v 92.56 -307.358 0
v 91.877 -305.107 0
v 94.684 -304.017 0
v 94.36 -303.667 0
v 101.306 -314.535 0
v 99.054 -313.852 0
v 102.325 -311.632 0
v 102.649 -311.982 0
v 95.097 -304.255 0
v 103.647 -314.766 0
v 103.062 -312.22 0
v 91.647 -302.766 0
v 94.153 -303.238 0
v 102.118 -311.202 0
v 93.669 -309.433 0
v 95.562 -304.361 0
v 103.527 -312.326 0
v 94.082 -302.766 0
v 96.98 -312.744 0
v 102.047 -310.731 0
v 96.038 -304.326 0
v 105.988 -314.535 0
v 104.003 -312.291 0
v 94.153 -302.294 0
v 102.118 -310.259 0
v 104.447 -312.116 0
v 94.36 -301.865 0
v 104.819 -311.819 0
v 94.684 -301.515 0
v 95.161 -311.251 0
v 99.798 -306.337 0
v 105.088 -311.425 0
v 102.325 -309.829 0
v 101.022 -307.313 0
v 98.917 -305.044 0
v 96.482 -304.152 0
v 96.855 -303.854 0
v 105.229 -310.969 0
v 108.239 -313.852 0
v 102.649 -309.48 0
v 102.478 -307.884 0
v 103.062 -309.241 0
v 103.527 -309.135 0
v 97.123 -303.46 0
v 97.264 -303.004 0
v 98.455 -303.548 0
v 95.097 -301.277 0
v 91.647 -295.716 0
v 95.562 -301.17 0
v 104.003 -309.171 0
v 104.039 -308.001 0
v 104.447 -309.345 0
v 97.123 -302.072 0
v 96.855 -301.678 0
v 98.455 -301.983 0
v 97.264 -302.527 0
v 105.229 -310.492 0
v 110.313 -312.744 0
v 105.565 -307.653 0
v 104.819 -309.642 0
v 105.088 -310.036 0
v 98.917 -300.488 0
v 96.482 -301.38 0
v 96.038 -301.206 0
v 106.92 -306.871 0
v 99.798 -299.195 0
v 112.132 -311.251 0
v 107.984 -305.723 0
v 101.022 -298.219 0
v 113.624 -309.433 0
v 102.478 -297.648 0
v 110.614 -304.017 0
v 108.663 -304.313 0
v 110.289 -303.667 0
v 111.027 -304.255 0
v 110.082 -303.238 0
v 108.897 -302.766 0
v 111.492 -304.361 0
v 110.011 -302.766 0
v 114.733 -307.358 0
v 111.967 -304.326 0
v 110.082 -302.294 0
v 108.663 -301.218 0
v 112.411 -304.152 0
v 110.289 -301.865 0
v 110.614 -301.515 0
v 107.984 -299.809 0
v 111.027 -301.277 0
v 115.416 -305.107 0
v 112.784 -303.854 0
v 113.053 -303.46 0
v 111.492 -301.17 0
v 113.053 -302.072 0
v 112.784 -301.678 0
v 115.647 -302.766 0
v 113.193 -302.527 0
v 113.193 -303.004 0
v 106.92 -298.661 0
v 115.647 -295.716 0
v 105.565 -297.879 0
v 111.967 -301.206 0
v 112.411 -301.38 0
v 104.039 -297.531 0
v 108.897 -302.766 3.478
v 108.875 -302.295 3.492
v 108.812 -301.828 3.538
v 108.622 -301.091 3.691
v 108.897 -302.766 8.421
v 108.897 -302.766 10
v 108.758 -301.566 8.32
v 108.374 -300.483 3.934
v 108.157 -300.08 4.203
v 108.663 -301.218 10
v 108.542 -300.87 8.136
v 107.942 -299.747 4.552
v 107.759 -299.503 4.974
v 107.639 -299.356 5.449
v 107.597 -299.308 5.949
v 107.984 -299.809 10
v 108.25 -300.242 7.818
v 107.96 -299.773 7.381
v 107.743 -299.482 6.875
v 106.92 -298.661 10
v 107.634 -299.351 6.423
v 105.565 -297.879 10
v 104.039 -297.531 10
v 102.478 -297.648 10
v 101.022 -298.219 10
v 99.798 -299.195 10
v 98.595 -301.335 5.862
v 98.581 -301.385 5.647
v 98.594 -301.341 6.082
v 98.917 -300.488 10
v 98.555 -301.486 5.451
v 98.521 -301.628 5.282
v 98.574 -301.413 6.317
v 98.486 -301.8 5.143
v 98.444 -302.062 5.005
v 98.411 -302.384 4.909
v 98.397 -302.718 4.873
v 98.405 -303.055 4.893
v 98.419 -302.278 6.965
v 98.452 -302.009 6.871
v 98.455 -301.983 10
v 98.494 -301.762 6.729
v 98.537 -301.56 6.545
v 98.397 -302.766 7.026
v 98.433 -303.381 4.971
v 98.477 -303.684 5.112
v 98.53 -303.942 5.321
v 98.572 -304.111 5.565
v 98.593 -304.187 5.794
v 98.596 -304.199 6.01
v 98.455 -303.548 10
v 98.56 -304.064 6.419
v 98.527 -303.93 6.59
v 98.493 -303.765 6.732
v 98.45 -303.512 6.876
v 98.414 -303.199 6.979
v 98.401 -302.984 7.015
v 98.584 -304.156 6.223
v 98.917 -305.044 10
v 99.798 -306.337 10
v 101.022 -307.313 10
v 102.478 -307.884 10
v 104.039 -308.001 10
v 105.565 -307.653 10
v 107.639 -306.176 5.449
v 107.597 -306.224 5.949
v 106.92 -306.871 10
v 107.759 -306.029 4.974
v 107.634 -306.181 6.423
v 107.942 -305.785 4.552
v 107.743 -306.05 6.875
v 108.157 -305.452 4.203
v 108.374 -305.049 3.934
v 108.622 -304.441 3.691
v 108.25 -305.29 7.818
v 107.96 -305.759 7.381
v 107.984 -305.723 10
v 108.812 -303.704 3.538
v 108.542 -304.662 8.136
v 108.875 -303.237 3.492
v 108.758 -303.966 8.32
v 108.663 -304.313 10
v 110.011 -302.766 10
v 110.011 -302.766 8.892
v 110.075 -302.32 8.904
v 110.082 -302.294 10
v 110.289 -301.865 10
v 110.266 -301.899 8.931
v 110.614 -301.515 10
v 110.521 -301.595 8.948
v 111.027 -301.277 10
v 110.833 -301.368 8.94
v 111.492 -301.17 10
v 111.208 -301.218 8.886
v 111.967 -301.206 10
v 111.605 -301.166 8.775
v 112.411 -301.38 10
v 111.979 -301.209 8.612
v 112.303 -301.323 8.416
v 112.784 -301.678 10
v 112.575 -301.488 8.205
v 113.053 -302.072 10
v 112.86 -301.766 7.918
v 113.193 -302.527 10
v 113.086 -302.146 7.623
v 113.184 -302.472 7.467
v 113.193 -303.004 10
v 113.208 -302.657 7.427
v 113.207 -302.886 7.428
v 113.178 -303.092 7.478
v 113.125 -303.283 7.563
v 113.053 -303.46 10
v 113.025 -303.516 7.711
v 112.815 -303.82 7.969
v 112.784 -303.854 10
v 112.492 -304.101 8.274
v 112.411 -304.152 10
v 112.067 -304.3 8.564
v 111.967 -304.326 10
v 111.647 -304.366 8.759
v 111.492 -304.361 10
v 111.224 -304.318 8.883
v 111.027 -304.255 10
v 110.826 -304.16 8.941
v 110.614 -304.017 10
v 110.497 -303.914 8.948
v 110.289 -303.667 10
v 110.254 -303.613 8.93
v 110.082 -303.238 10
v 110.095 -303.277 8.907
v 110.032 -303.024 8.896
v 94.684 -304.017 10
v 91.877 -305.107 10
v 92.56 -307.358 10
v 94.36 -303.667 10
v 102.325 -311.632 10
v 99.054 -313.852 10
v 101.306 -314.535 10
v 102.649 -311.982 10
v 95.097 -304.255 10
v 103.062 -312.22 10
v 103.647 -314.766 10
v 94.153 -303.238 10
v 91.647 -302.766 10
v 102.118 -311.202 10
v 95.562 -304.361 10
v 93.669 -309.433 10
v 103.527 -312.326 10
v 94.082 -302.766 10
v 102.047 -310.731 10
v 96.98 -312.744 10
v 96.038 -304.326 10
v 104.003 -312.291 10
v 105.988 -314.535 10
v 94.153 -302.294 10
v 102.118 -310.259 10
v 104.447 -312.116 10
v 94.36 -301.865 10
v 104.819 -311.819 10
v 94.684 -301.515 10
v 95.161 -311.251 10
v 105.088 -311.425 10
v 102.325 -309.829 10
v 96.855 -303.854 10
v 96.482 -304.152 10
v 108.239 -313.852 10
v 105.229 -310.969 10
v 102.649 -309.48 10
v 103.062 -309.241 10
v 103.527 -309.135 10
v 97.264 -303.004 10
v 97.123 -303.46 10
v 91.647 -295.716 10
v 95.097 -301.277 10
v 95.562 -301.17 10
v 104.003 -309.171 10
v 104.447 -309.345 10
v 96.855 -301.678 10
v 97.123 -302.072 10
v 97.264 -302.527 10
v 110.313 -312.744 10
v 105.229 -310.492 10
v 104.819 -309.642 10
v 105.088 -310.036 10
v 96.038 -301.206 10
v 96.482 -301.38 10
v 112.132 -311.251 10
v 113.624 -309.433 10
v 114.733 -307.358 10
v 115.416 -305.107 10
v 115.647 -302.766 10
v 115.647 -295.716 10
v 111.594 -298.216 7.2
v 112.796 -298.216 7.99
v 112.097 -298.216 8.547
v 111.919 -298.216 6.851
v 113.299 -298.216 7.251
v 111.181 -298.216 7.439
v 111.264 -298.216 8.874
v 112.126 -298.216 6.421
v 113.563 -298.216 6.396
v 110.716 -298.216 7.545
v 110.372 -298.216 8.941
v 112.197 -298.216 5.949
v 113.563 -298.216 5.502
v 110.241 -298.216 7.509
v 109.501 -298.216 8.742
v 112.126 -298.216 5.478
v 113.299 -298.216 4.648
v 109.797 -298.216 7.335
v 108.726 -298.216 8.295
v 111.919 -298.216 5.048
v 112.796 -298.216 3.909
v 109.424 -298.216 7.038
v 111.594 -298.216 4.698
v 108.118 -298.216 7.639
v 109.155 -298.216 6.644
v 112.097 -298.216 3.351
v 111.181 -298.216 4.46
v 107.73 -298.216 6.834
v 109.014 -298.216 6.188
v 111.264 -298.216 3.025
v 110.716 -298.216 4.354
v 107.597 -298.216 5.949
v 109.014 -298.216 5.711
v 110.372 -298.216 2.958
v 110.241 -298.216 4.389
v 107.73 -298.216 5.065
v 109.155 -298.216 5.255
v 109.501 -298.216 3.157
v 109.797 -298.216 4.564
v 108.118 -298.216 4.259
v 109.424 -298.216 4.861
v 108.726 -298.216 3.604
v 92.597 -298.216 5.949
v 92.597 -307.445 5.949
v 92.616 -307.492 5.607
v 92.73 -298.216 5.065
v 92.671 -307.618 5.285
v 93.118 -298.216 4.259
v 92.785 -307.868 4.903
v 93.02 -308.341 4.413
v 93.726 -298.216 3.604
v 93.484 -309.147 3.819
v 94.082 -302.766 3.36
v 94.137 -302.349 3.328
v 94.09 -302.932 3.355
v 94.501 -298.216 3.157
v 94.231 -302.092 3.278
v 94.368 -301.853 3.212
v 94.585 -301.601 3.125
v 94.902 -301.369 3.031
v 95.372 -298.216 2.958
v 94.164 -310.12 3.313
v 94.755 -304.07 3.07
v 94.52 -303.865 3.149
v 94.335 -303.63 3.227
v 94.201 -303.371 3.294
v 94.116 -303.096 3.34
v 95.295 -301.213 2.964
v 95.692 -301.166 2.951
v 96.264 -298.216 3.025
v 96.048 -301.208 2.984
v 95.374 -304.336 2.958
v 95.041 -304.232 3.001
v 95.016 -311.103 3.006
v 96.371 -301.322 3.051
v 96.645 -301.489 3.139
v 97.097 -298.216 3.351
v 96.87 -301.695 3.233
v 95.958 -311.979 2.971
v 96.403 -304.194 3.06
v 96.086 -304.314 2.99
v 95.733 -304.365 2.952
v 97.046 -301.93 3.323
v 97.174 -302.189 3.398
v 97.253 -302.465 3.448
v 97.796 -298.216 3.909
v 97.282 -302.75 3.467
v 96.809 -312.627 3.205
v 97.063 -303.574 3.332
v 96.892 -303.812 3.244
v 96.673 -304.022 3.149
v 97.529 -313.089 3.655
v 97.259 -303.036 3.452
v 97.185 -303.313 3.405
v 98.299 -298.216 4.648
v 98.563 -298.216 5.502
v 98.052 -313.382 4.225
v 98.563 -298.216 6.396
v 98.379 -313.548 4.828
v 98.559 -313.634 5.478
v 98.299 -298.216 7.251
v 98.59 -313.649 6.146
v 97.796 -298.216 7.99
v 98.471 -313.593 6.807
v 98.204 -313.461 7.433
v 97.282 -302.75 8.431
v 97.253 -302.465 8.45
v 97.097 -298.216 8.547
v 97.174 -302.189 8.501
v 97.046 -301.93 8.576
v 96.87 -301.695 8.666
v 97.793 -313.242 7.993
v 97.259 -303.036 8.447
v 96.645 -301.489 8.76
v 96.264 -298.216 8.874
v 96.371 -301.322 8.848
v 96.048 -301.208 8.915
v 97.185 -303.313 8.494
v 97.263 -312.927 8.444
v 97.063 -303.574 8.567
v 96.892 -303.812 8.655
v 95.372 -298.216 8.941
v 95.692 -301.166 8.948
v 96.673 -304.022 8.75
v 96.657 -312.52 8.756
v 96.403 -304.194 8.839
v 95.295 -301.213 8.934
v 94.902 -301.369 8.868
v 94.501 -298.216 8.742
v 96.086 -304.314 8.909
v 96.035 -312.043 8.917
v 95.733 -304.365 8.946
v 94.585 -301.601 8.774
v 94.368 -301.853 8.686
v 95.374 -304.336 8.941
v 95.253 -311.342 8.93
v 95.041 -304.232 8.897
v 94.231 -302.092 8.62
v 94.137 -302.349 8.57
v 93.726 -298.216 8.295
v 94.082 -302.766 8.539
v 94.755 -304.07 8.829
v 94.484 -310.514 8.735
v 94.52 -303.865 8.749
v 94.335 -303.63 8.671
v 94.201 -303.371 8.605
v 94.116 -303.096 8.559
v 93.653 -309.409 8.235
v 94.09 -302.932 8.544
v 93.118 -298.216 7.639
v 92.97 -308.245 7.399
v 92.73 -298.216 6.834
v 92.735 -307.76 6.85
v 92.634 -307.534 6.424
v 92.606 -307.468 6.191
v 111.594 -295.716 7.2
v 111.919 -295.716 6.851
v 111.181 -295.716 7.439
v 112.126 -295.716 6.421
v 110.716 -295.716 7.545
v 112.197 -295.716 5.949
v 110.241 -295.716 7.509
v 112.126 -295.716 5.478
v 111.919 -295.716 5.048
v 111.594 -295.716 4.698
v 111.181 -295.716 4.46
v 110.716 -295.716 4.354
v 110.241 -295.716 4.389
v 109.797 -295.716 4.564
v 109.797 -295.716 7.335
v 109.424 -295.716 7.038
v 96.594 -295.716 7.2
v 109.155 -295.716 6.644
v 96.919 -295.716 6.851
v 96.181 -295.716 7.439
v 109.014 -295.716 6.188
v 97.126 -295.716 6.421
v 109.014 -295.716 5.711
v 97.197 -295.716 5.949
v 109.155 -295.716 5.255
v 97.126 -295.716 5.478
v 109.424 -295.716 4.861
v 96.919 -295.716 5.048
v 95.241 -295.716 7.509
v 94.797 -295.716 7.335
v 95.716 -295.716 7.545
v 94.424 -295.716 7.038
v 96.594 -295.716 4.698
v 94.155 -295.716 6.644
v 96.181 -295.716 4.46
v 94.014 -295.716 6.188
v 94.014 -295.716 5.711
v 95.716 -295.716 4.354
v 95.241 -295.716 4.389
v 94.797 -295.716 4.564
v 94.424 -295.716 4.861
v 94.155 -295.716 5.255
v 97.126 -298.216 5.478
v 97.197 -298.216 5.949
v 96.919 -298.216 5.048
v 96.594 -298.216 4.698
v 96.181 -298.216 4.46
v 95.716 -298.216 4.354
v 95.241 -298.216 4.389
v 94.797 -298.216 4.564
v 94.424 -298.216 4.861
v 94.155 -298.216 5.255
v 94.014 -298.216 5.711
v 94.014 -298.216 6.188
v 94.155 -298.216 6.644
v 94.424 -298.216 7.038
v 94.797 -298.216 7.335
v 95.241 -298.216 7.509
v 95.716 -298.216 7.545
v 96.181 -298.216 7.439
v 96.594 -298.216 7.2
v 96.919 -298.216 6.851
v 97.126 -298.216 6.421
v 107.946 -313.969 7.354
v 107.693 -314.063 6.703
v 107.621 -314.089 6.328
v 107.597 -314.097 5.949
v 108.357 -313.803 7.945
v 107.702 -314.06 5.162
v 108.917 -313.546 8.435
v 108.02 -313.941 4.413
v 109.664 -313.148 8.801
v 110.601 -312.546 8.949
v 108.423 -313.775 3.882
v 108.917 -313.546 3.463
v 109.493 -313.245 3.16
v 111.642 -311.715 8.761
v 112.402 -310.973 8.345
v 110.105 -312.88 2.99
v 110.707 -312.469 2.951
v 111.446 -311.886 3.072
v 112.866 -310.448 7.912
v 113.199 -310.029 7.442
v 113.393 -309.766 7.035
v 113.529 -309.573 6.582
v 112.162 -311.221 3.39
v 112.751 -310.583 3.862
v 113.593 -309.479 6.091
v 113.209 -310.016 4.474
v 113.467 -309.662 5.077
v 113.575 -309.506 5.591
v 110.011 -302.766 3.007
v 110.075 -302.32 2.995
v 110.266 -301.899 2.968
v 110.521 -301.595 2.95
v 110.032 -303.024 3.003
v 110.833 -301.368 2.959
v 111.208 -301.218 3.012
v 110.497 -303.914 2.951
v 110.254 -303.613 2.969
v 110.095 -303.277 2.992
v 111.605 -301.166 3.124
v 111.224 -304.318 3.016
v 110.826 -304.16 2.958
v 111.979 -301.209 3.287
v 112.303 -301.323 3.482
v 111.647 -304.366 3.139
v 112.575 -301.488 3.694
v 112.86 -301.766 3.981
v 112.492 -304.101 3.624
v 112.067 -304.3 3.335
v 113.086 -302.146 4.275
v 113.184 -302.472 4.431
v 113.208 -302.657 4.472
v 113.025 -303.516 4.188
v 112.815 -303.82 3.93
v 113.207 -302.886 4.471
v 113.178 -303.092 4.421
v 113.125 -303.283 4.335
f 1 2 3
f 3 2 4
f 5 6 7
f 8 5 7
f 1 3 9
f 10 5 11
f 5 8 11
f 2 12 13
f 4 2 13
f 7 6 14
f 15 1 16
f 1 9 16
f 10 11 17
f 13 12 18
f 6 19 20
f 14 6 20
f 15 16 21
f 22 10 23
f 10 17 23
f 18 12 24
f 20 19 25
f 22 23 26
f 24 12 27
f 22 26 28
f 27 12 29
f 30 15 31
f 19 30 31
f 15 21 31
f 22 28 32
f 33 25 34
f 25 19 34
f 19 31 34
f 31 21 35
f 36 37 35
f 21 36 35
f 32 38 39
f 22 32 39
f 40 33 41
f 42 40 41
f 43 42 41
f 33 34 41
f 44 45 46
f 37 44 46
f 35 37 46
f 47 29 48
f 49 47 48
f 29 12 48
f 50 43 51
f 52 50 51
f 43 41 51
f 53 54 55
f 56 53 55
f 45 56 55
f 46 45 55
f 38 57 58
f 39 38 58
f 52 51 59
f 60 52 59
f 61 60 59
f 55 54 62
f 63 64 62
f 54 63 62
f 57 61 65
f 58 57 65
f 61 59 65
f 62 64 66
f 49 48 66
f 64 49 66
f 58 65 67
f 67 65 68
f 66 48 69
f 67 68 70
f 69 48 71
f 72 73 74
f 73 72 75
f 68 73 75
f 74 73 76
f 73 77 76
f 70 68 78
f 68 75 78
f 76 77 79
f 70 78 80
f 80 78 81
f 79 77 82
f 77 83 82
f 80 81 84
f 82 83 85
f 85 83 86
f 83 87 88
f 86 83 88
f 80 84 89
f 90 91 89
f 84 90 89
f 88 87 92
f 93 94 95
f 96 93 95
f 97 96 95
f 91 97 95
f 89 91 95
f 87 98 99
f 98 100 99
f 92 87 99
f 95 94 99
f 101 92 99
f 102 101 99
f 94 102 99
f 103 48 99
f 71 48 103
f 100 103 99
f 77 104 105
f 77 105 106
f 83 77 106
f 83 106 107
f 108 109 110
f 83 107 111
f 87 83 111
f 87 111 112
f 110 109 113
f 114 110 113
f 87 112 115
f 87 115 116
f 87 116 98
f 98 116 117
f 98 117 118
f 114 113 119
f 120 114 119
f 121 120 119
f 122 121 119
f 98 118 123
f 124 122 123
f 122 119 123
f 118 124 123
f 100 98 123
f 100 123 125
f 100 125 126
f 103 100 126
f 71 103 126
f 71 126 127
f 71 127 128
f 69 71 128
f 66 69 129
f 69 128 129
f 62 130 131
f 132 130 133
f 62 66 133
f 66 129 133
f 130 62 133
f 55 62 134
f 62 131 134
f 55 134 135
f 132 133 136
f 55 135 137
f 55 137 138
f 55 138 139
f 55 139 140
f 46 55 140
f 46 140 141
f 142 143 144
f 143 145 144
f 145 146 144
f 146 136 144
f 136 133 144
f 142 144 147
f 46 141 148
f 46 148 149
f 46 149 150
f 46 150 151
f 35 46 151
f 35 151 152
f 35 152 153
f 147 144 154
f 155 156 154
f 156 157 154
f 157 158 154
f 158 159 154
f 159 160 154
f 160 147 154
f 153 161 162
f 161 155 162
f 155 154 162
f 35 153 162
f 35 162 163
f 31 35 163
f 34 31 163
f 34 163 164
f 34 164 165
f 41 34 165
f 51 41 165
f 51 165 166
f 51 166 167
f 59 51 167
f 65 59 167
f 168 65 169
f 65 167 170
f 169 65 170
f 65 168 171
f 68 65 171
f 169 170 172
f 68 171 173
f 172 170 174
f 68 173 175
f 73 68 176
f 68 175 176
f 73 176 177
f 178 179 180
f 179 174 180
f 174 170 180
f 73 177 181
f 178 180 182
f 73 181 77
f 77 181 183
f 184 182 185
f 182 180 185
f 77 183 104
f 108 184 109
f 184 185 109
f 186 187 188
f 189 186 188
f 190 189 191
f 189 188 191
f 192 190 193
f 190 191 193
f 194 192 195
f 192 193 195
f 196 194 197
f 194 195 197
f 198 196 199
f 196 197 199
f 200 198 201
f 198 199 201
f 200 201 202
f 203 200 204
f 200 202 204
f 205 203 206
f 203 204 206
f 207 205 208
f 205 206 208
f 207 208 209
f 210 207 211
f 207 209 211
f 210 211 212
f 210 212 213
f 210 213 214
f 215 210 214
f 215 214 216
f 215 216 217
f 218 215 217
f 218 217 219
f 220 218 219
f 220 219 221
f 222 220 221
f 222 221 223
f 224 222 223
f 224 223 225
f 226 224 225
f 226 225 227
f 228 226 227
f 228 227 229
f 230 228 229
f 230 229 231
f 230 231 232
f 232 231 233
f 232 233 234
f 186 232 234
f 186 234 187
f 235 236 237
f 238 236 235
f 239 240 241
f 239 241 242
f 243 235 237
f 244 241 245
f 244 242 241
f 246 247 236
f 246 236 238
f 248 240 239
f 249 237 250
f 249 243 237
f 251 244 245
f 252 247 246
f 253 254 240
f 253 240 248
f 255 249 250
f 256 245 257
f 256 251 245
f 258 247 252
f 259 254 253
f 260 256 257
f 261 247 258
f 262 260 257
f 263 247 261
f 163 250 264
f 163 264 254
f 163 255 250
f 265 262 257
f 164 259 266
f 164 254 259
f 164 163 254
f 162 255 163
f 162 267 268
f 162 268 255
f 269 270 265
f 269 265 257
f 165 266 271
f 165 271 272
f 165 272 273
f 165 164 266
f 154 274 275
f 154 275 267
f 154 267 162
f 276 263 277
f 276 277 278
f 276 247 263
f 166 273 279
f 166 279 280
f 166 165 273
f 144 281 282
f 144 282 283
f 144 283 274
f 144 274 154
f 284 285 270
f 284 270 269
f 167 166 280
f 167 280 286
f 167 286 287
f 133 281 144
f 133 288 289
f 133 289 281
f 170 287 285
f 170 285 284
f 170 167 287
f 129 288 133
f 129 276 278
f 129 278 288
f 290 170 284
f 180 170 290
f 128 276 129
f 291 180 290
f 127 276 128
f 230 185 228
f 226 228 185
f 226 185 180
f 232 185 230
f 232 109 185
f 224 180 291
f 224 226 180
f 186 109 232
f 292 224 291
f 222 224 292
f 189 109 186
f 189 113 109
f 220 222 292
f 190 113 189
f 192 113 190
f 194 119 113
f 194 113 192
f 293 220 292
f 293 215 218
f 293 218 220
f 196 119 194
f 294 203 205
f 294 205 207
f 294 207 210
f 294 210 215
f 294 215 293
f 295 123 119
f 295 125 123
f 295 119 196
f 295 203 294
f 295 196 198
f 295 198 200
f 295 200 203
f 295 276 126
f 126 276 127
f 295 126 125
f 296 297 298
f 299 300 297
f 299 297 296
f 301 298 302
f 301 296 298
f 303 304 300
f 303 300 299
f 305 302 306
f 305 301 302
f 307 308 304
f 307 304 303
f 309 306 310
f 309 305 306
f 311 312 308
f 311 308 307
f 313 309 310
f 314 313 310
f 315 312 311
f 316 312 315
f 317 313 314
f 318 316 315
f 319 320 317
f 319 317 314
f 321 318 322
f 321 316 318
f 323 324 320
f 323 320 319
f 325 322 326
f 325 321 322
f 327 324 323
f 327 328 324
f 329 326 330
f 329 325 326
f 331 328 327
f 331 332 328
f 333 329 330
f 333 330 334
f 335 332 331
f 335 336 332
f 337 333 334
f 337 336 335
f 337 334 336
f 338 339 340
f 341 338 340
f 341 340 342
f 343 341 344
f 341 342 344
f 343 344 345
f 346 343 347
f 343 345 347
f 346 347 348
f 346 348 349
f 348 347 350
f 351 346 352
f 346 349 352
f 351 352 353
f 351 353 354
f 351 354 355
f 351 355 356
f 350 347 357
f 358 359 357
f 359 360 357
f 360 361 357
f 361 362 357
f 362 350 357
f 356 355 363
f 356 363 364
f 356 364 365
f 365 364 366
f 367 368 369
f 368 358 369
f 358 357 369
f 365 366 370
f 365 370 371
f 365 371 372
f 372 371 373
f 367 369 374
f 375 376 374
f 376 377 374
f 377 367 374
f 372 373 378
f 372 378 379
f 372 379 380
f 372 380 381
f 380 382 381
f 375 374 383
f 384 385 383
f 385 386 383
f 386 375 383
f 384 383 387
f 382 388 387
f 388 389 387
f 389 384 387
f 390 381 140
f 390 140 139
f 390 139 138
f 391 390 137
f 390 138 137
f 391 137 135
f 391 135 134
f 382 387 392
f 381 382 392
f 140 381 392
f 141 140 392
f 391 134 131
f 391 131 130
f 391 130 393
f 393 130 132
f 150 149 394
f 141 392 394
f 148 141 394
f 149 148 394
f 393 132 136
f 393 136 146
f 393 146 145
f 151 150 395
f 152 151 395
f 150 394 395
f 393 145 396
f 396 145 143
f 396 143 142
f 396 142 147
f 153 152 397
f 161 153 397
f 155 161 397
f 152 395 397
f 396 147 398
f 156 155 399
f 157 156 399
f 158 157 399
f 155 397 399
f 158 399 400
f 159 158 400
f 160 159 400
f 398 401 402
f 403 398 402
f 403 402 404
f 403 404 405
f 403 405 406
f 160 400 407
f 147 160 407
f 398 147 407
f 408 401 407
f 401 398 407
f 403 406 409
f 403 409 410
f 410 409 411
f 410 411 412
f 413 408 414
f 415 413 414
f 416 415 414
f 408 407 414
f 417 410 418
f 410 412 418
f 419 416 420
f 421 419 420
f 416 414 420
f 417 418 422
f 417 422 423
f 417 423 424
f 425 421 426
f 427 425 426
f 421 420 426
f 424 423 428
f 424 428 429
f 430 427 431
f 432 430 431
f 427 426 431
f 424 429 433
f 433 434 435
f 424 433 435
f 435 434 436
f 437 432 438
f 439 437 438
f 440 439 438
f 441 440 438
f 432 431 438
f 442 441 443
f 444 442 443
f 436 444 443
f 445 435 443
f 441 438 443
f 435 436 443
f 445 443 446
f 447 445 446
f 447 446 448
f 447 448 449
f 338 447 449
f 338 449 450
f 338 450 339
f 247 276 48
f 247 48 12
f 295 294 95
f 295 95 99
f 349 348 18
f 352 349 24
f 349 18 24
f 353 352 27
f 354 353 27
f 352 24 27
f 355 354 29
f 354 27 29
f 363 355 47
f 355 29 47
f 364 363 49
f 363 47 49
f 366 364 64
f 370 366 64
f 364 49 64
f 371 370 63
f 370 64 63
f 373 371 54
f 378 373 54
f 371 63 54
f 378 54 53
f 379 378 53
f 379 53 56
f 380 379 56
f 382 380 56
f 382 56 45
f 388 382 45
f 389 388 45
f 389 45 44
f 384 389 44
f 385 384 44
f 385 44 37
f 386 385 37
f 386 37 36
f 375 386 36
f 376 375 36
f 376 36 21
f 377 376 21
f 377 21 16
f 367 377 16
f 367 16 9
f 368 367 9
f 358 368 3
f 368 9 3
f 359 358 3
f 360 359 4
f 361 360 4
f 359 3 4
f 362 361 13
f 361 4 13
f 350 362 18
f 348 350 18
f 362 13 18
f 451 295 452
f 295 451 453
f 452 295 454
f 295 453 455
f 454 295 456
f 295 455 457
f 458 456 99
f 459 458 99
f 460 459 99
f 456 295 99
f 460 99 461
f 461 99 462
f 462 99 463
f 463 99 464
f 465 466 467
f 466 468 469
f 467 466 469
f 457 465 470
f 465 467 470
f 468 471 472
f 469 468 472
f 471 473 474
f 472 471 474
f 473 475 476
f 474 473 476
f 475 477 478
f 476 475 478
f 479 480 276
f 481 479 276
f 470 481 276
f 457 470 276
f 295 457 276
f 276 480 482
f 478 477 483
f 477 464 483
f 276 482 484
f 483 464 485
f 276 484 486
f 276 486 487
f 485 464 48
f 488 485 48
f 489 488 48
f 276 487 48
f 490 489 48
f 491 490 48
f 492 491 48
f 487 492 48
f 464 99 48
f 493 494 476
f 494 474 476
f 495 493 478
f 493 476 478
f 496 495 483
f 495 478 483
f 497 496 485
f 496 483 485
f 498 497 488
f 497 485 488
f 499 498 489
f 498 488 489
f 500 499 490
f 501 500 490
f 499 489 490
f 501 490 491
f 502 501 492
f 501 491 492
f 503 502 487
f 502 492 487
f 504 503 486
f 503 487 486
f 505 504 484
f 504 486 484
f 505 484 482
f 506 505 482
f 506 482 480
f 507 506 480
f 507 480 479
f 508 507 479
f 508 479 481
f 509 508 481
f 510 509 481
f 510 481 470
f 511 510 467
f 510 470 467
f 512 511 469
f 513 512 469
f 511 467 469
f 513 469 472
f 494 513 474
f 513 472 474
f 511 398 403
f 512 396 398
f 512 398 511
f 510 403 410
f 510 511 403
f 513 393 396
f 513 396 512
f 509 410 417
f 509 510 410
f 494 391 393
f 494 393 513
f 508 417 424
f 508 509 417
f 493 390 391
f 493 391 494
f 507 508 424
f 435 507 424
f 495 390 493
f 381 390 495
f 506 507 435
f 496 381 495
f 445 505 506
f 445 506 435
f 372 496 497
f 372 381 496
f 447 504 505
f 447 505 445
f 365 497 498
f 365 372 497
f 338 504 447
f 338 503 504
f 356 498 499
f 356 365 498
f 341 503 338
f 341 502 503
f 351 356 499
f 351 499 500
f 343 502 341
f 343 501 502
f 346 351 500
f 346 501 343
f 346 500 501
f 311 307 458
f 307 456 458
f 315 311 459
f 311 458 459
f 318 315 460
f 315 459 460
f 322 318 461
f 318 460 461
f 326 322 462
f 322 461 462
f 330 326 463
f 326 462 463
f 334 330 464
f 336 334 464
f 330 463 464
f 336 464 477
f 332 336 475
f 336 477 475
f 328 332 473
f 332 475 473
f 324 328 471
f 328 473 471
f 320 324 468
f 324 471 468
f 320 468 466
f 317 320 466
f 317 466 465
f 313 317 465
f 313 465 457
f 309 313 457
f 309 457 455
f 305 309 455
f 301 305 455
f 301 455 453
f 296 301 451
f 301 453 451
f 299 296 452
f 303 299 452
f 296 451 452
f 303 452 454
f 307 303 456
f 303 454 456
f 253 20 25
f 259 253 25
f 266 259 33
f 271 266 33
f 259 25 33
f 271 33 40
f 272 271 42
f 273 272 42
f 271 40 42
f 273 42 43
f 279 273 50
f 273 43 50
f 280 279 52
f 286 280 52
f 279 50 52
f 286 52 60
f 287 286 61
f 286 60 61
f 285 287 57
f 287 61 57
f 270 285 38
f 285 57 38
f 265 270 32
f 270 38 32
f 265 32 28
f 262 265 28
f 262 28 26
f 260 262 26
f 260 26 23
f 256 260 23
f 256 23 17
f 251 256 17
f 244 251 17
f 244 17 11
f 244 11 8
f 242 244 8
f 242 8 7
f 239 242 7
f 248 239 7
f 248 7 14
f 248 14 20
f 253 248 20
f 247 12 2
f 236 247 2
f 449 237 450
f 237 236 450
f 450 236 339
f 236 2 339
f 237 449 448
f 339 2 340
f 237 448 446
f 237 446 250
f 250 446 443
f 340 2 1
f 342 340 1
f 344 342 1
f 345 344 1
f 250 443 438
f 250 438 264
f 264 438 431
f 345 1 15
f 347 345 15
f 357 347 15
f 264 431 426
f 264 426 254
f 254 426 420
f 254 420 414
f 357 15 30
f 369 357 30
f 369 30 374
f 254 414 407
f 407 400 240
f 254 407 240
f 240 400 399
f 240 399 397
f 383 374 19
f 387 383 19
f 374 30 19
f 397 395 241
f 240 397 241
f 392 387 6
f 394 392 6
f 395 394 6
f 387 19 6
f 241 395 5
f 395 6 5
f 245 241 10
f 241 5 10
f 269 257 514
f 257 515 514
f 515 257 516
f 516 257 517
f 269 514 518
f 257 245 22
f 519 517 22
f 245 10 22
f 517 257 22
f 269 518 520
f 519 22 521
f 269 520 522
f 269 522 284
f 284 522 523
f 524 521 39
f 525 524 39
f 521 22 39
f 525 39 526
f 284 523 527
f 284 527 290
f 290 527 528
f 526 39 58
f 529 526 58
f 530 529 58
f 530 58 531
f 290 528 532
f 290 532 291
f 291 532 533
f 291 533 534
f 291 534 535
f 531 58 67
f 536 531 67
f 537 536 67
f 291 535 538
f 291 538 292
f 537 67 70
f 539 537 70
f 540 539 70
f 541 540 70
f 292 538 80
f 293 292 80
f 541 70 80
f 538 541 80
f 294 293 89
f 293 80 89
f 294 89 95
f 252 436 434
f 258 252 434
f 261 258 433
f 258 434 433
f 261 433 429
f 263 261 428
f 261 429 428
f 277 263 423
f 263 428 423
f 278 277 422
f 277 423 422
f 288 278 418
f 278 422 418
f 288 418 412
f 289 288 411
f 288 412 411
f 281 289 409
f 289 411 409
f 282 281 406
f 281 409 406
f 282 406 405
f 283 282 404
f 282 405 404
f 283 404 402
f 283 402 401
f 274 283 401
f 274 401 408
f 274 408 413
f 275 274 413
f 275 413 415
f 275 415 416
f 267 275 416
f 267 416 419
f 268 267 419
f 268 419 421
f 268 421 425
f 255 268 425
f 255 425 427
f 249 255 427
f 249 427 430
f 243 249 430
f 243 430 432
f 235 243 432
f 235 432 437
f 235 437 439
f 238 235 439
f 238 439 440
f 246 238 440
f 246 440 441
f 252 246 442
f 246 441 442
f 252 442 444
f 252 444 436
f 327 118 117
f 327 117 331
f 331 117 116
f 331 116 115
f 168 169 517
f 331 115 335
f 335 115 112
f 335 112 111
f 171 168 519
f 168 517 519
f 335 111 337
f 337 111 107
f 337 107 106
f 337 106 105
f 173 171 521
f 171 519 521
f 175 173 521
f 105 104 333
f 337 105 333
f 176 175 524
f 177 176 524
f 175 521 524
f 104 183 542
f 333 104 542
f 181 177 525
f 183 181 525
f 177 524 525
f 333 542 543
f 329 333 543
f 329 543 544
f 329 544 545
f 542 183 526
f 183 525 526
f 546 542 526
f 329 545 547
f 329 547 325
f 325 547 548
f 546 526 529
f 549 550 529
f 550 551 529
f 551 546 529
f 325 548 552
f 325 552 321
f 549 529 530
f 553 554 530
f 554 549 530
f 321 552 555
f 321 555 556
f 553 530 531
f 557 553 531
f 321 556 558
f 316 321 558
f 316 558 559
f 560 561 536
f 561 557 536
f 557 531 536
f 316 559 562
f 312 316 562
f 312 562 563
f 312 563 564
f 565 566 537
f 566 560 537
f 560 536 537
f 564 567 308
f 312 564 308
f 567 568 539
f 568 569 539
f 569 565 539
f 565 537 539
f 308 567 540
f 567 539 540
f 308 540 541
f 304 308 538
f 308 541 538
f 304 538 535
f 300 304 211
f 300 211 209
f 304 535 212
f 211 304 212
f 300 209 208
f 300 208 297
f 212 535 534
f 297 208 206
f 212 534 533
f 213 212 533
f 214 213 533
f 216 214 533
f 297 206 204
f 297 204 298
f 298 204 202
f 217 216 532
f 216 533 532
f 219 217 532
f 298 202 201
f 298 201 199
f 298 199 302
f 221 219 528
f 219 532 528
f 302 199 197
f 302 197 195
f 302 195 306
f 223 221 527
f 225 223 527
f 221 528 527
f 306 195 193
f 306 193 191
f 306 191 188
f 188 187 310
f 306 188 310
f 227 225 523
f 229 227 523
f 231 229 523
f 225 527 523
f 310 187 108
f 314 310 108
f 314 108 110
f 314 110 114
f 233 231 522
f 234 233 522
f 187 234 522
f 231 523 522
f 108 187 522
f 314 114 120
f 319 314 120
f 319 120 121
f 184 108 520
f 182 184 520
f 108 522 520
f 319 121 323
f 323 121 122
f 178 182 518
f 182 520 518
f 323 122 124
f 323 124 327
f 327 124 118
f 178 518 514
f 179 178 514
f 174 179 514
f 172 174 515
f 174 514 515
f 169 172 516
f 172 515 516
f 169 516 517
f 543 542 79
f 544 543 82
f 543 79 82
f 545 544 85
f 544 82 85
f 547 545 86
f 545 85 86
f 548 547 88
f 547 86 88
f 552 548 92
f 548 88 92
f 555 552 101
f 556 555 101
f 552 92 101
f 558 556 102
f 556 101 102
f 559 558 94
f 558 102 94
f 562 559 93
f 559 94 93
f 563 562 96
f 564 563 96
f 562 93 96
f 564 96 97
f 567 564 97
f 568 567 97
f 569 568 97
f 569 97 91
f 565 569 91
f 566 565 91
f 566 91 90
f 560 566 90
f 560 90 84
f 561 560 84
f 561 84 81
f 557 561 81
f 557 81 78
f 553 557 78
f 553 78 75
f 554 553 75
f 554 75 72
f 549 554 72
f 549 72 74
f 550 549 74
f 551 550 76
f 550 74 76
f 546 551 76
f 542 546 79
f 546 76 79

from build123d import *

# Parameters (mm, degrees)
RESSALTO_EXTRUS_O1_DEPTH                = 10
ESBO_O2_R                               = 5.25
CORTE_EXTRUS_O1_DEPTH                   = 16
CORTE_EXTRUS_O1_DEPTH_BACK              = 31.8
CBORE_FOR_M5_HEX_HEAD_BOLT1_D           = 3.2
CBORE_FOR_M5_HEX_HEAD_BOLT1_CBORE_D     = 6
CBORE_FOR_M5_HEX_HEAD_BOLT1_CBORE_DEPTH = 16.5
M3_CLEARANCE_HOLE5_D                    = 3.2


with BuildPart() as part:
    # Esboço1 → Ressalto-extrusão1 (new body)
    with BuildSketch(Plane.XY):
        with BuildLine():
            Line((115.646593224, -302.7659332), (115.646593224, -295.7159332))
            Line((115.646593224, -295.7159332), (91.646593224, -295.7159332))
            Line((91.646593224, -295.7159332), (91.646593224, -302.7659332))
            ThreePointArc((91.646593224, -302.7659332), (103.646593224, -314.7659332), (115.646593224, -302.7659332))
        make_face()
    extrude(amount=RESSALTO_EXTRUS_O1_DEPTH)

    # Esboço2 → Corte-extrusão1 (cut, two sides)
    with BuildSketch(Plane.XY.offset(10)) as corte_extrus_o1_sk:
        with Locations((103.646593224, -302.7659332)):
            Circle(ESBO_O2_R)
    extrude(amount=CORTE_EXTRUS_O1_DEPTH, mode=Mode.SUBTRACT)
    extrude(corte_extrus_o1_sk.sketch, amount=-CORTE_EXTRUS_O1_DEPTH_BACK, mode=Mode.SUBTRACT)

    # CBORE for M5 Hex Head Bolt1 (through all)
    with Locations(Plane(origin=(0, -314.7159332, 0), x_dir=(-1, 0, 0), z_dir=(0, -1, 0))):
        with Locations((-95.596593224, -5.949346208), (-110.596593224, -5.949346208)):
            CounterBoreHole(CBORE_FOR_M5_HEX_HEAD_BOLT1_D / 2, CBORE_FOR_M5_HEX_HEAD_BOLT1_CBORE_D / 2, CBORE_FOR_M5_HEX_HEAD_BOLT1_CBORE_DEPTH)

    # M3 Clearance Hole5 (through all)
    with Locations(Plane.XY.offset(10)):
        with Locations((95.681870132, -302.765933199), (103.646593224, -310.730656291), (111.611316315, -302.765933199)):
            Hole(M3_CLEARANCE_HOLE5_D / 2)


solid = part.part
